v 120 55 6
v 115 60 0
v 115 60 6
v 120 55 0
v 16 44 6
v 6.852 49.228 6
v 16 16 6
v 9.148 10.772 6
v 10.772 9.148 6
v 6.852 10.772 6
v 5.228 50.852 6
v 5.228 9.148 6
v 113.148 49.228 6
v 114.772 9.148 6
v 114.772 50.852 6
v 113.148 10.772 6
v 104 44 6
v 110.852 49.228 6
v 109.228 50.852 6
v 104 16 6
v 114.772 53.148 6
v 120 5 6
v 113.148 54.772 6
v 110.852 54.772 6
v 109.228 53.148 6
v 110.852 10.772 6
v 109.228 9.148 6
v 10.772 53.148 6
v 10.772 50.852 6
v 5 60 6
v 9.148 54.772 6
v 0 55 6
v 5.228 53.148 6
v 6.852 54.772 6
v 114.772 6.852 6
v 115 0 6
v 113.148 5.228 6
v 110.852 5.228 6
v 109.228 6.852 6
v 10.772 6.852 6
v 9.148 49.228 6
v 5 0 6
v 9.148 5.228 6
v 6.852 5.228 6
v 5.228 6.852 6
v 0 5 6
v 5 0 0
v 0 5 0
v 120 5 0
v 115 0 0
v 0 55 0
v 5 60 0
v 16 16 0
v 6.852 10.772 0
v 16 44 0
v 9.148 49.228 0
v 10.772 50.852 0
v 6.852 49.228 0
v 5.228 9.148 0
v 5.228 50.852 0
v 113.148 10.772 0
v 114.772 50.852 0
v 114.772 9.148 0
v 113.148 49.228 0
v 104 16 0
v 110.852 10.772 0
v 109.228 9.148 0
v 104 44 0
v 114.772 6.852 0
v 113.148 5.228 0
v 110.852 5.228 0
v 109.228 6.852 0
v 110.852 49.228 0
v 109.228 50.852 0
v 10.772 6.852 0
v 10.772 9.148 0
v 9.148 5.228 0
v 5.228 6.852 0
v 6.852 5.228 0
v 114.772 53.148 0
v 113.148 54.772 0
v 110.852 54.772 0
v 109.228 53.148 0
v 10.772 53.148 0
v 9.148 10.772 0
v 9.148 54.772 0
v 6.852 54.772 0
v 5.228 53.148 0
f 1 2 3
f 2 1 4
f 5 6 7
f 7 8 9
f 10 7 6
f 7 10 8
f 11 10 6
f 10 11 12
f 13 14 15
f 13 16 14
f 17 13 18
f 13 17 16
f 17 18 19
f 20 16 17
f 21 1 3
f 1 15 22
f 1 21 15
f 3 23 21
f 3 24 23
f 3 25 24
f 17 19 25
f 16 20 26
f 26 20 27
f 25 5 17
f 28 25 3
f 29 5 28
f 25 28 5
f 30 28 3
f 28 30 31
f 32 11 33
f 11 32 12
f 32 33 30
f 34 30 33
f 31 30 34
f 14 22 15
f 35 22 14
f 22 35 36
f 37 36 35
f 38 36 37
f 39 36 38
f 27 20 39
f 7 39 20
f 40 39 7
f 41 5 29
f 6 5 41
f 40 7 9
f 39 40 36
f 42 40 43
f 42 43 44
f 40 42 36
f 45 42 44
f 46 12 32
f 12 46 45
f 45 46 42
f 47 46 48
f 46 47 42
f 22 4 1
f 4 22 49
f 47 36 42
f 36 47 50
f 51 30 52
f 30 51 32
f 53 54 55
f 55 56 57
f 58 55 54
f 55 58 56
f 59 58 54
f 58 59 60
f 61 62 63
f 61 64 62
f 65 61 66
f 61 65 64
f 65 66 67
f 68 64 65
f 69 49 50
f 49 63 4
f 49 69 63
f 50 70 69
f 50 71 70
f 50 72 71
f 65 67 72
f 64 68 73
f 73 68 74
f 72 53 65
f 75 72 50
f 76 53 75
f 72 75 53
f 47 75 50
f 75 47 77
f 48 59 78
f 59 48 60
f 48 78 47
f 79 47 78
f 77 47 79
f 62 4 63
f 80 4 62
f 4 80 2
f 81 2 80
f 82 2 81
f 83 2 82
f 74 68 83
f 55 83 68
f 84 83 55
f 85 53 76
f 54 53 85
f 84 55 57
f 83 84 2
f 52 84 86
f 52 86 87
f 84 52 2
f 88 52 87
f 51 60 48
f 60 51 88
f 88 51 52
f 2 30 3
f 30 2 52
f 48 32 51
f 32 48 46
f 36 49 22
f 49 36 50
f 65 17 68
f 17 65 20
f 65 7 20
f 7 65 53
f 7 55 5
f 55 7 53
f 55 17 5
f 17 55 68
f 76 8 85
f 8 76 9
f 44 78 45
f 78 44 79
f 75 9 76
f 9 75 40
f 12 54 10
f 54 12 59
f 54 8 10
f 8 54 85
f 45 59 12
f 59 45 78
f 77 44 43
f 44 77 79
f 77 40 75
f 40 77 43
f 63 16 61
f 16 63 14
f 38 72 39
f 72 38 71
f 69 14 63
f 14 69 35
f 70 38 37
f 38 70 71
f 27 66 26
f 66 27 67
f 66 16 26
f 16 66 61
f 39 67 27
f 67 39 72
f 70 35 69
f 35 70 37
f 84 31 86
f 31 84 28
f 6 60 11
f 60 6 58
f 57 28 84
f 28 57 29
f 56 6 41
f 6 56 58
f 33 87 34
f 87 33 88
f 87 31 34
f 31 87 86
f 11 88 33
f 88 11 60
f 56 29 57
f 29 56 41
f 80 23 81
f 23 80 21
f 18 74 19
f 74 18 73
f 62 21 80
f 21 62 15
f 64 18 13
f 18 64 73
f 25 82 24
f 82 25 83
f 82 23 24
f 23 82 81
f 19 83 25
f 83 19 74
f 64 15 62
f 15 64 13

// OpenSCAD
$fn = 32;

// ----------------------------------------------------------------------
// Frame plate: 120 x 60 frame, 16 mm rails
// ----------------------------------------------------------------------

// --- parameters (mm) ---
plate_l = 120;            // plate length, X
plate_w = 60;             // plate width, Y
plate_t = 6;              // plate thickness, Z (extrusion height)
corner_c = 5;             // corner chamfer
frame_bar = 16;           // frame rail width
bolt_r = 3;               // corner bolt window radius
bolt_inset = 8;           // bolt centre inset from the edges

win_l = plate_l - 2 * frame_bar;  // window length
win_w = plate_w - 2 * frame_bar;  // window width
bolt_d = 2 * bolt_r;  // corner hole diameter

profile = [[5, 0], [115, 0], [120, 5], [120, 55], [115, 60], [5, 60], [0, 55], [0, 5]];  // primary outline, 8 points, counter clockwise
void_1 = [[16, 16], [104, 16], [104, 44], [16, 44]];  // the window, 4 points
void_2 = [[10.772, 9.148], [9.148, 10.772], [6.852, 10.772], [5.228, 9.148], [5.228, 6.852], [6.852, 5.228], [9.148, 5.228], [10.772, 6.852]];  // corner bolt window, 8 points
void_3 = [[114.772, 9.148], [113.148, 10.772], [110.852, 10.772], [109.228, 9.148], [109.228, 6.852], [110.852, 5.228], [113.148, 5.228], [114.772, 6.852]];  // corner bolt window, 8 points
void_4 = [[10.772, 53.148], [9.148, 54.772], [6.852, 54.772], [5.228, 53.148], [5.228, 50.852], [6.852, 49.228], [9.148, 49.228], [10.772, 50.852]];  // corner bolt window, 8 points
void_5 = [[114.772, 53.148], [113.148, 54.772], [110.852, 54.772], [109.228, 53.148], [109.228, 50.852], [110.852, 49.228], [113.148, 49.228], [114.772, 50.852]];  // corner bolt window, 8 points

// --- the one profile operation ---
difference() {
  linear_extrude(height = plate_t) polygon(points = profile);
  translate([0, 0, -1])
    linear_extrude(height = plate_t + 2) polygon(points = void_1);
  translate([0, 0, -1])
    linear_extrude(height = plate_t + 2) polygon(points = void_2);
  translate([0, 0, -1])
    linear_extrude(height = plate_t + 2) polygon(points = void_3);
  translate([0, 0, -1])
    linear_extrude(height = plate_t + 2) polygon(points = void_4);
  translate([0, 0, -1])
    linear_extrude(height = plate_t + 2) polygon(points = void_5);
}
